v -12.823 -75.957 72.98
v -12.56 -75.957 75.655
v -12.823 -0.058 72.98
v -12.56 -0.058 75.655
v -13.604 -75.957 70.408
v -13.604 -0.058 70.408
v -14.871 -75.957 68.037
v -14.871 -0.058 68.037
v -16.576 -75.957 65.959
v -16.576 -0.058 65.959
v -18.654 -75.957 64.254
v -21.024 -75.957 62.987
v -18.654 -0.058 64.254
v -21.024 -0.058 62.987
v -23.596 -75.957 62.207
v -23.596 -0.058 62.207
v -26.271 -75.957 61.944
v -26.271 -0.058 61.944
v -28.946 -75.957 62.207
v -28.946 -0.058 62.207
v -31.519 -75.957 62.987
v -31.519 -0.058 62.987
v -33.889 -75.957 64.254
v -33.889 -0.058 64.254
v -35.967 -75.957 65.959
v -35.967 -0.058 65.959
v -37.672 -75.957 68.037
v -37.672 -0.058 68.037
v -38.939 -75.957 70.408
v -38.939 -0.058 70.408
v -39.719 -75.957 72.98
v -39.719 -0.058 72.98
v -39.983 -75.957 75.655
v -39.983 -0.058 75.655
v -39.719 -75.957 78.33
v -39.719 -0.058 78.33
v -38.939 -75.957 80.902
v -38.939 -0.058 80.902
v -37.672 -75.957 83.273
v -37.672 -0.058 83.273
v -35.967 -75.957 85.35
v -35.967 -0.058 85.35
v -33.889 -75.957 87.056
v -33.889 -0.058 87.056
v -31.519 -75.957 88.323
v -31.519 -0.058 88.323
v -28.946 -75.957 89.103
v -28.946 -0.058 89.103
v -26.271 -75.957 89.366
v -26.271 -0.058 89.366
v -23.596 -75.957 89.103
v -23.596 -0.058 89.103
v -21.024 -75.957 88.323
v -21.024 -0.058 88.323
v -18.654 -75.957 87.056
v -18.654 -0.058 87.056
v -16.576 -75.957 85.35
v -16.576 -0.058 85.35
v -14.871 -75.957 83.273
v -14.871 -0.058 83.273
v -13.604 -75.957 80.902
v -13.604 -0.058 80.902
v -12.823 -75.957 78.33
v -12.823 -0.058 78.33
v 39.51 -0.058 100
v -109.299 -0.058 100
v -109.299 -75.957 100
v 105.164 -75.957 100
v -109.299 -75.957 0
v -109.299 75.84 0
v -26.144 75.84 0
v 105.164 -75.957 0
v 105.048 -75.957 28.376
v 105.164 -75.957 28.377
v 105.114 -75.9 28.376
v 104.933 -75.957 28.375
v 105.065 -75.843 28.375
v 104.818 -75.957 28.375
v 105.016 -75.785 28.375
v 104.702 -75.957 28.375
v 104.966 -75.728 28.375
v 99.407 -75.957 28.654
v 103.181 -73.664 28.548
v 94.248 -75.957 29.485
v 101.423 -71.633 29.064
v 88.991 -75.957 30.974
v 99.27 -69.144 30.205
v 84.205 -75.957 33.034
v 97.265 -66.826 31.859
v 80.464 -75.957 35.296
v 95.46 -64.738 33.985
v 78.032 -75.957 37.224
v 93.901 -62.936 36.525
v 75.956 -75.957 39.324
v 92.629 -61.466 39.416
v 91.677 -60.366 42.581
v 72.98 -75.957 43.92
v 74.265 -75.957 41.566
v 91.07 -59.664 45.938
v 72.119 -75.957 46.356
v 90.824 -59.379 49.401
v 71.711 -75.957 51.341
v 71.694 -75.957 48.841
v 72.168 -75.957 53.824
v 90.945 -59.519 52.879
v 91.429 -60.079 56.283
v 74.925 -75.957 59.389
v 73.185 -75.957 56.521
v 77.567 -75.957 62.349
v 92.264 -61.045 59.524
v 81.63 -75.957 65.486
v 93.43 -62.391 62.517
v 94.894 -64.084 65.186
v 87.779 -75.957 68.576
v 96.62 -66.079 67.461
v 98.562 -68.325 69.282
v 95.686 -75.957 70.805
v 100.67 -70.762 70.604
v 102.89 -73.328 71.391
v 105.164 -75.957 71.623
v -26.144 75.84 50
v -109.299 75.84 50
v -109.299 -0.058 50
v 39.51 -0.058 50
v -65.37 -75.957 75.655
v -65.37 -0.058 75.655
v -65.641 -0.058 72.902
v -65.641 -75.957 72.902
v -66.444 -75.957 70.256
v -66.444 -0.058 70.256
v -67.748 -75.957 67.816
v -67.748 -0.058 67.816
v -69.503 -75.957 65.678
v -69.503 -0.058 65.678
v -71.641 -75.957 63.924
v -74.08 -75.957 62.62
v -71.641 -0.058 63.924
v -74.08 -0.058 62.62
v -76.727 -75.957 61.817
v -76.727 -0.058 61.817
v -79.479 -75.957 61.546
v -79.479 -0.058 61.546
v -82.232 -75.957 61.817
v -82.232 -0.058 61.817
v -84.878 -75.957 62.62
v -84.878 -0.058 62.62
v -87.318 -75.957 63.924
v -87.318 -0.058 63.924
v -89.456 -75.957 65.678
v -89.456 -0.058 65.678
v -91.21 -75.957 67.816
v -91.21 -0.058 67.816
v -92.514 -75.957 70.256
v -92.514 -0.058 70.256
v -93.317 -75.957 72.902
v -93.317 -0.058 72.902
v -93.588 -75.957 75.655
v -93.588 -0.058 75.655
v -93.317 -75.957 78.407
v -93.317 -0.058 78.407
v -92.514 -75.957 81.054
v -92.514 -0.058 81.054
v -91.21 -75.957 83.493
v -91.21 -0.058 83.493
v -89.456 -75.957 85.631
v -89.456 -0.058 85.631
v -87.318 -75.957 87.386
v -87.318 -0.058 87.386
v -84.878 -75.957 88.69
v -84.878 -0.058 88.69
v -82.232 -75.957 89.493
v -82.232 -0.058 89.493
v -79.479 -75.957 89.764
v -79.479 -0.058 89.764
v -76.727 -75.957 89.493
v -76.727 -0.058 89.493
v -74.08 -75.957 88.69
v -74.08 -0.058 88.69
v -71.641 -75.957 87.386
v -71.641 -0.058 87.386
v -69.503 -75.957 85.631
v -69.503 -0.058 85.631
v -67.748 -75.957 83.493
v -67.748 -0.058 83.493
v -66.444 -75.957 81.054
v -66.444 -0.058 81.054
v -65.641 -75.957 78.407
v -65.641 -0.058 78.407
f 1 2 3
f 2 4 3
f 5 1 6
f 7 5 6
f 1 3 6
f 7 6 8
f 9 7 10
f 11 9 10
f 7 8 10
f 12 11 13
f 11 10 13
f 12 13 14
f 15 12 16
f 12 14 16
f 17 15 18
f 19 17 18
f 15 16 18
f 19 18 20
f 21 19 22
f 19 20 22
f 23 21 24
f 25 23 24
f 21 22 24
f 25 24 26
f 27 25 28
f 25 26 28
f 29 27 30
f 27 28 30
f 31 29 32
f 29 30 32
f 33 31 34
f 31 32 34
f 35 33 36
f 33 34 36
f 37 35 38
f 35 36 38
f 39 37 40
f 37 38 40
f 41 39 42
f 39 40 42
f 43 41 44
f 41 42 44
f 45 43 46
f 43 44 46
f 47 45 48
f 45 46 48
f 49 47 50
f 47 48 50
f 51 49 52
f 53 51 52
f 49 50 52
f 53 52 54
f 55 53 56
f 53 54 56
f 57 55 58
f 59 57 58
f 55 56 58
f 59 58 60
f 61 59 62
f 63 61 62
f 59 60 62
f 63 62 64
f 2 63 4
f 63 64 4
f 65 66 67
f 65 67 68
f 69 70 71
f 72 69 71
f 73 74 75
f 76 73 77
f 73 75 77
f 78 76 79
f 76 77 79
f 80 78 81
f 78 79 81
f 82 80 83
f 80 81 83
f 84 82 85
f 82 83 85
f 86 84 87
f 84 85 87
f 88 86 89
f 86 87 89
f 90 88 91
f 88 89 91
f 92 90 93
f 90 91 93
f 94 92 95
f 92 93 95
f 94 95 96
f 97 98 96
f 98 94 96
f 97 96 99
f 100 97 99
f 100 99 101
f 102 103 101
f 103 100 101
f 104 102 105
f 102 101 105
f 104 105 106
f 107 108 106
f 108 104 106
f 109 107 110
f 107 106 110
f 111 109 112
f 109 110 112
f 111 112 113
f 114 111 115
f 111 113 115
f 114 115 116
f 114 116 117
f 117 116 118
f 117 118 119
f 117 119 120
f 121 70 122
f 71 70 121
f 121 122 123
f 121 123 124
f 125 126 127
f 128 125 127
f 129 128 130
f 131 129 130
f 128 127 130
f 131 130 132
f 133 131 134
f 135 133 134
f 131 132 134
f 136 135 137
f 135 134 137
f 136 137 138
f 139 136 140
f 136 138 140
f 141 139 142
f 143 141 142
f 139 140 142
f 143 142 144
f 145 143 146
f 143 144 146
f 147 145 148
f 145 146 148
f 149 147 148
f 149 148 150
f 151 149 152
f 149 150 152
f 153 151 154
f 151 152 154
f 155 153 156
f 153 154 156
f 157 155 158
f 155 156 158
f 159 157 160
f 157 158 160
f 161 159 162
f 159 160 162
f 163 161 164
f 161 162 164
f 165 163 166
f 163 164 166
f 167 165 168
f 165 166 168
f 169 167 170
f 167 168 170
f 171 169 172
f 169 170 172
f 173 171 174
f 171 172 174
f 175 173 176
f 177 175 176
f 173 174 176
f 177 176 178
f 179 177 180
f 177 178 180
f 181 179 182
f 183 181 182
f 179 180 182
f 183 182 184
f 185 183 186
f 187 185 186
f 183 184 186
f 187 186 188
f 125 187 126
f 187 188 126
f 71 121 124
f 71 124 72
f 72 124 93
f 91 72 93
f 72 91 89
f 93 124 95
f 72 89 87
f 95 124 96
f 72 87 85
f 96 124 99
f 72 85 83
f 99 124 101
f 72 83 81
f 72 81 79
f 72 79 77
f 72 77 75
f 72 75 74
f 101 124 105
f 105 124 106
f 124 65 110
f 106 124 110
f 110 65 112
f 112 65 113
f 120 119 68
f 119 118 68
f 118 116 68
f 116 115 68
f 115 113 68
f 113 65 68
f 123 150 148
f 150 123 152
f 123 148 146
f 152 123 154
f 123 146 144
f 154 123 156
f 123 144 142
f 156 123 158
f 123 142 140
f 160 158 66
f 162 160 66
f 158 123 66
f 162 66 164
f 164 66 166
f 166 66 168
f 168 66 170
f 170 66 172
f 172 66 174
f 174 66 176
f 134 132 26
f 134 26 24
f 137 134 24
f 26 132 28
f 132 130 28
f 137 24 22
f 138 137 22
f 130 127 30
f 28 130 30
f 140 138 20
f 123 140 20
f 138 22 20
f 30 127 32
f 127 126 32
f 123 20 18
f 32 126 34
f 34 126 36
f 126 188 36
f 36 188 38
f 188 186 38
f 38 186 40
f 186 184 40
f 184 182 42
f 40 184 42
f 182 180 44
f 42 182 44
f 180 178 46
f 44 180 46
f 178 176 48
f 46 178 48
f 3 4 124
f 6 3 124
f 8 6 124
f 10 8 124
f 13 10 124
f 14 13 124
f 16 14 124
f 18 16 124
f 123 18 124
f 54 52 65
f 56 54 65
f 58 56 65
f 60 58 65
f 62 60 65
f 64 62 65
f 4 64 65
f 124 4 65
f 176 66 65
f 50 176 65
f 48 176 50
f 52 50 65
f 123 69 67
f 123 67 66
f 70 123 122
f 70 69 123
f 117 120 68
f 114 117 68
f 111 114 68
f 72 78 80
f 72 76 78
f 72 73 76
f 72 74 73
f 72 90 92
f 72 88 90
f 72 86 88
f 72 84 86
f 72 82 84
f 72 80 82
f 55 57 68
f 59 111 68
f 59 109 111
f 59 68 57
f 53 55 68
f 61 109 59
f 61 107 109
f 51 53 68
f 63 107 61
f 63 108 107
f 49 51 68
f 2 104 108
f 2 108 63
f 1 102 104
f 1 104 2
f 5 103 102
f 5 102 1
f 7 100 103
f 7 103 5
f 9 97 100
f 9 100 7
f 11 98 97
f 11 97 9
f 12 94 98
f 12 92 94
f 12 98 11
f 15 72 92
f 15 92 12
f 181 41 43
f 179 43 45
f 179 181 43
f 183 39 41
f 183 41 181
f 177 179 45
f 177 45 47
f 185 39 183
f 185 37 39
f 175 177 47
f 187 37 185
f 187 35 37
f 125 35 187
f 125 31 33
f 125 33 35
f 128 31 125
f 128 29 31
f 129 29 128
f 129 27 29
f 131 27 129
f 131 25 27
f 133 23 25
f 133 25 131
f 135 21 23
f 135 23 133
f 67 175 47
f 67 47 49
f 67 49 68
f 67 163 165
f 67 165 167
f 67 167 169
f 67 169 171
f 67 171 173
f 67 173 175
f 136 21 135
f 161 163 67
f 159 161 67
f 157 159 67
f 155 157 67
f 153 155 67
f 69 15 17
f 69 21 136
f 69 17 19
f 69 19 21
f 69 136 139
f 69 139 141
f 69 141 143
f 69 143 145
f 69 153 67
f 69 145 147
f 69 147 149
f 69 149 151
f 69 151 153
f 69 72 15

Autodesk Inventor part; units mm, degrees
ref_plane "YZ Plane" through (0, 0, 0) normal (1, 0, 0) x (0, 1, 0)
ref_plane "XZ Plane" through (0, 0, 0) normal (0, 1, 0) x (-1, 0, 0)
ref_plane "XY Plane" through (0, 0, 0) normal (0, 0, 1) x (1, 0, 0)
sketch "스케치1" plane through (0, 0, 0) normal (0, 0, 1) x (1, 0, 0)
  line L0 (-109.2986, 75.8401) -> (105.1639, 75.8401)
  line L1 (105.1639, 75.8401) -> (105.1639, -75.9568)
  line L2 (105.1639, -75.9568) -> (-109.2986, -75.9568)
  line L3 (-109.2986, -75.9568) -> (-109.2986, 75.8401)
  point P0 (0, 0)
extrude "돌출1" add sketch "스케치1" along normal blind 100
sketch "스케치2" plane through (0, 0, 100) normal (0, 0, 1) x (1, 0, 0)
  line L0 (-109.2986, -75.9568) -> (105.1639, -75.9568) projected
  line L1 (-26.2714, 75.9875) -> (105.1639, -75.9568)
  line L2 (105.1639, -75.9568) -> (105.1639, 75.9875)
  line L3 (105.1639, 75.9875) -> (-26.2714, 75.9875)
  point P0 (0, 0)
extrude "돌출2" cut sketch "스케치2" against normal blind 100
sketch "스케치3" plane through (-109.2986, 75.8401, 100) normal (0, 1, 0) x (1, 0, 0)
  point P0 (109.2986, 100)
sketch "스케치4" plane through (0, 0, 100) normal (0, 0, 1) x (1, 0, 0)
  line L0 (-109.2986, -75.9568) -> (-109.2986, 75.8401) projected
  line L1 (-109.2986, 75.8401) -> (-109.2986, -0.0583)
  line L2 (-26.1439, 75.8401) -> (105.1639, -75.9568) projected
  line L3 (39.51, -0.0583) -> (-26.1439, 75.8401)
  line L4 (-26.1439, 75.8401) -> (-109.2986, 75.8401)
  line L5 (-109.2986, -0.0583) -> (39.51, -0.0583)
  point P0 (0, 0)
extrude "돌출3" cut sketch "스케치4" against normal blind 50
sketch "스케치5" plane through (-109.2986, -0.0583, 100) normal (0, 1, 0) x (1, 0, 0)
  circle A0 centre (83.0272, 24.3451) radius 13.7114
  circle A1 centre (29.8194, 24.3451) radius 14.1089
  point P0 (109.2986, 100)
extrude "돌출4" cut sketch "스케치5" against normal blind 80
sketch "스케치6" plane through (105.1639, -75.9568, 100) normal (0.7563, 0.6542, 0) x (0, 0, -1)
  circle A0 centre (50, 0.3021) radius 21.6251
  point P0 (100, 126.2468)
extrude "돌출5" cut sketch "스케치6" against normal blind 80
properties part number "240510_3Dsketch01"
